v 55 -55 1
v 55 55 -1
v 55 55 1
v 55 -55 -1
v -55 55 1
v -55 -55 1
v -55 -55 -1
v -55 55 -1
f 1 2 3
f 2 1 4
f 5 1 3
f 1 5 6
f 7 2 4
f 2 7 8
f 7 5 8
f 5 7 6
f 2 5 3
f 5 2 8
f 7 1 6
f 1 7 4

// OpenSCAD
size = 100;
ext = 10;
wall = 4;
height = 1;

module img(invert) {
	translate([-size/2,-size/2]) 
		linear_extrude(height, convexity= 4)
			resize([size,size]) 
				offset(r = 0) import("image.dxf");
}

module base(height = height) {
	union() {
		img();
		circle(r = 16, h = 1);
	}
}

module sqbase(height = height, ext = ext) {
	cube([size + ext, size + ext, 1], center = true);
}

module positive() {
	union() {
		img();
		translate([0,0,-height / 2]) sqbase();
		translate([0,0,height / 2]) difference() {
			cube([size + ext, size + ext, height] , center = true);
			cube([size + ext - wall, size + ext- wall, height*1.001], center = true);
		}
	}
}

module negative() {
	difference() {
		cube([size + ext, size + ext, height * 2], center = true);
		translate([0, 0, -height * 0]) img();
	}
}

negative();
